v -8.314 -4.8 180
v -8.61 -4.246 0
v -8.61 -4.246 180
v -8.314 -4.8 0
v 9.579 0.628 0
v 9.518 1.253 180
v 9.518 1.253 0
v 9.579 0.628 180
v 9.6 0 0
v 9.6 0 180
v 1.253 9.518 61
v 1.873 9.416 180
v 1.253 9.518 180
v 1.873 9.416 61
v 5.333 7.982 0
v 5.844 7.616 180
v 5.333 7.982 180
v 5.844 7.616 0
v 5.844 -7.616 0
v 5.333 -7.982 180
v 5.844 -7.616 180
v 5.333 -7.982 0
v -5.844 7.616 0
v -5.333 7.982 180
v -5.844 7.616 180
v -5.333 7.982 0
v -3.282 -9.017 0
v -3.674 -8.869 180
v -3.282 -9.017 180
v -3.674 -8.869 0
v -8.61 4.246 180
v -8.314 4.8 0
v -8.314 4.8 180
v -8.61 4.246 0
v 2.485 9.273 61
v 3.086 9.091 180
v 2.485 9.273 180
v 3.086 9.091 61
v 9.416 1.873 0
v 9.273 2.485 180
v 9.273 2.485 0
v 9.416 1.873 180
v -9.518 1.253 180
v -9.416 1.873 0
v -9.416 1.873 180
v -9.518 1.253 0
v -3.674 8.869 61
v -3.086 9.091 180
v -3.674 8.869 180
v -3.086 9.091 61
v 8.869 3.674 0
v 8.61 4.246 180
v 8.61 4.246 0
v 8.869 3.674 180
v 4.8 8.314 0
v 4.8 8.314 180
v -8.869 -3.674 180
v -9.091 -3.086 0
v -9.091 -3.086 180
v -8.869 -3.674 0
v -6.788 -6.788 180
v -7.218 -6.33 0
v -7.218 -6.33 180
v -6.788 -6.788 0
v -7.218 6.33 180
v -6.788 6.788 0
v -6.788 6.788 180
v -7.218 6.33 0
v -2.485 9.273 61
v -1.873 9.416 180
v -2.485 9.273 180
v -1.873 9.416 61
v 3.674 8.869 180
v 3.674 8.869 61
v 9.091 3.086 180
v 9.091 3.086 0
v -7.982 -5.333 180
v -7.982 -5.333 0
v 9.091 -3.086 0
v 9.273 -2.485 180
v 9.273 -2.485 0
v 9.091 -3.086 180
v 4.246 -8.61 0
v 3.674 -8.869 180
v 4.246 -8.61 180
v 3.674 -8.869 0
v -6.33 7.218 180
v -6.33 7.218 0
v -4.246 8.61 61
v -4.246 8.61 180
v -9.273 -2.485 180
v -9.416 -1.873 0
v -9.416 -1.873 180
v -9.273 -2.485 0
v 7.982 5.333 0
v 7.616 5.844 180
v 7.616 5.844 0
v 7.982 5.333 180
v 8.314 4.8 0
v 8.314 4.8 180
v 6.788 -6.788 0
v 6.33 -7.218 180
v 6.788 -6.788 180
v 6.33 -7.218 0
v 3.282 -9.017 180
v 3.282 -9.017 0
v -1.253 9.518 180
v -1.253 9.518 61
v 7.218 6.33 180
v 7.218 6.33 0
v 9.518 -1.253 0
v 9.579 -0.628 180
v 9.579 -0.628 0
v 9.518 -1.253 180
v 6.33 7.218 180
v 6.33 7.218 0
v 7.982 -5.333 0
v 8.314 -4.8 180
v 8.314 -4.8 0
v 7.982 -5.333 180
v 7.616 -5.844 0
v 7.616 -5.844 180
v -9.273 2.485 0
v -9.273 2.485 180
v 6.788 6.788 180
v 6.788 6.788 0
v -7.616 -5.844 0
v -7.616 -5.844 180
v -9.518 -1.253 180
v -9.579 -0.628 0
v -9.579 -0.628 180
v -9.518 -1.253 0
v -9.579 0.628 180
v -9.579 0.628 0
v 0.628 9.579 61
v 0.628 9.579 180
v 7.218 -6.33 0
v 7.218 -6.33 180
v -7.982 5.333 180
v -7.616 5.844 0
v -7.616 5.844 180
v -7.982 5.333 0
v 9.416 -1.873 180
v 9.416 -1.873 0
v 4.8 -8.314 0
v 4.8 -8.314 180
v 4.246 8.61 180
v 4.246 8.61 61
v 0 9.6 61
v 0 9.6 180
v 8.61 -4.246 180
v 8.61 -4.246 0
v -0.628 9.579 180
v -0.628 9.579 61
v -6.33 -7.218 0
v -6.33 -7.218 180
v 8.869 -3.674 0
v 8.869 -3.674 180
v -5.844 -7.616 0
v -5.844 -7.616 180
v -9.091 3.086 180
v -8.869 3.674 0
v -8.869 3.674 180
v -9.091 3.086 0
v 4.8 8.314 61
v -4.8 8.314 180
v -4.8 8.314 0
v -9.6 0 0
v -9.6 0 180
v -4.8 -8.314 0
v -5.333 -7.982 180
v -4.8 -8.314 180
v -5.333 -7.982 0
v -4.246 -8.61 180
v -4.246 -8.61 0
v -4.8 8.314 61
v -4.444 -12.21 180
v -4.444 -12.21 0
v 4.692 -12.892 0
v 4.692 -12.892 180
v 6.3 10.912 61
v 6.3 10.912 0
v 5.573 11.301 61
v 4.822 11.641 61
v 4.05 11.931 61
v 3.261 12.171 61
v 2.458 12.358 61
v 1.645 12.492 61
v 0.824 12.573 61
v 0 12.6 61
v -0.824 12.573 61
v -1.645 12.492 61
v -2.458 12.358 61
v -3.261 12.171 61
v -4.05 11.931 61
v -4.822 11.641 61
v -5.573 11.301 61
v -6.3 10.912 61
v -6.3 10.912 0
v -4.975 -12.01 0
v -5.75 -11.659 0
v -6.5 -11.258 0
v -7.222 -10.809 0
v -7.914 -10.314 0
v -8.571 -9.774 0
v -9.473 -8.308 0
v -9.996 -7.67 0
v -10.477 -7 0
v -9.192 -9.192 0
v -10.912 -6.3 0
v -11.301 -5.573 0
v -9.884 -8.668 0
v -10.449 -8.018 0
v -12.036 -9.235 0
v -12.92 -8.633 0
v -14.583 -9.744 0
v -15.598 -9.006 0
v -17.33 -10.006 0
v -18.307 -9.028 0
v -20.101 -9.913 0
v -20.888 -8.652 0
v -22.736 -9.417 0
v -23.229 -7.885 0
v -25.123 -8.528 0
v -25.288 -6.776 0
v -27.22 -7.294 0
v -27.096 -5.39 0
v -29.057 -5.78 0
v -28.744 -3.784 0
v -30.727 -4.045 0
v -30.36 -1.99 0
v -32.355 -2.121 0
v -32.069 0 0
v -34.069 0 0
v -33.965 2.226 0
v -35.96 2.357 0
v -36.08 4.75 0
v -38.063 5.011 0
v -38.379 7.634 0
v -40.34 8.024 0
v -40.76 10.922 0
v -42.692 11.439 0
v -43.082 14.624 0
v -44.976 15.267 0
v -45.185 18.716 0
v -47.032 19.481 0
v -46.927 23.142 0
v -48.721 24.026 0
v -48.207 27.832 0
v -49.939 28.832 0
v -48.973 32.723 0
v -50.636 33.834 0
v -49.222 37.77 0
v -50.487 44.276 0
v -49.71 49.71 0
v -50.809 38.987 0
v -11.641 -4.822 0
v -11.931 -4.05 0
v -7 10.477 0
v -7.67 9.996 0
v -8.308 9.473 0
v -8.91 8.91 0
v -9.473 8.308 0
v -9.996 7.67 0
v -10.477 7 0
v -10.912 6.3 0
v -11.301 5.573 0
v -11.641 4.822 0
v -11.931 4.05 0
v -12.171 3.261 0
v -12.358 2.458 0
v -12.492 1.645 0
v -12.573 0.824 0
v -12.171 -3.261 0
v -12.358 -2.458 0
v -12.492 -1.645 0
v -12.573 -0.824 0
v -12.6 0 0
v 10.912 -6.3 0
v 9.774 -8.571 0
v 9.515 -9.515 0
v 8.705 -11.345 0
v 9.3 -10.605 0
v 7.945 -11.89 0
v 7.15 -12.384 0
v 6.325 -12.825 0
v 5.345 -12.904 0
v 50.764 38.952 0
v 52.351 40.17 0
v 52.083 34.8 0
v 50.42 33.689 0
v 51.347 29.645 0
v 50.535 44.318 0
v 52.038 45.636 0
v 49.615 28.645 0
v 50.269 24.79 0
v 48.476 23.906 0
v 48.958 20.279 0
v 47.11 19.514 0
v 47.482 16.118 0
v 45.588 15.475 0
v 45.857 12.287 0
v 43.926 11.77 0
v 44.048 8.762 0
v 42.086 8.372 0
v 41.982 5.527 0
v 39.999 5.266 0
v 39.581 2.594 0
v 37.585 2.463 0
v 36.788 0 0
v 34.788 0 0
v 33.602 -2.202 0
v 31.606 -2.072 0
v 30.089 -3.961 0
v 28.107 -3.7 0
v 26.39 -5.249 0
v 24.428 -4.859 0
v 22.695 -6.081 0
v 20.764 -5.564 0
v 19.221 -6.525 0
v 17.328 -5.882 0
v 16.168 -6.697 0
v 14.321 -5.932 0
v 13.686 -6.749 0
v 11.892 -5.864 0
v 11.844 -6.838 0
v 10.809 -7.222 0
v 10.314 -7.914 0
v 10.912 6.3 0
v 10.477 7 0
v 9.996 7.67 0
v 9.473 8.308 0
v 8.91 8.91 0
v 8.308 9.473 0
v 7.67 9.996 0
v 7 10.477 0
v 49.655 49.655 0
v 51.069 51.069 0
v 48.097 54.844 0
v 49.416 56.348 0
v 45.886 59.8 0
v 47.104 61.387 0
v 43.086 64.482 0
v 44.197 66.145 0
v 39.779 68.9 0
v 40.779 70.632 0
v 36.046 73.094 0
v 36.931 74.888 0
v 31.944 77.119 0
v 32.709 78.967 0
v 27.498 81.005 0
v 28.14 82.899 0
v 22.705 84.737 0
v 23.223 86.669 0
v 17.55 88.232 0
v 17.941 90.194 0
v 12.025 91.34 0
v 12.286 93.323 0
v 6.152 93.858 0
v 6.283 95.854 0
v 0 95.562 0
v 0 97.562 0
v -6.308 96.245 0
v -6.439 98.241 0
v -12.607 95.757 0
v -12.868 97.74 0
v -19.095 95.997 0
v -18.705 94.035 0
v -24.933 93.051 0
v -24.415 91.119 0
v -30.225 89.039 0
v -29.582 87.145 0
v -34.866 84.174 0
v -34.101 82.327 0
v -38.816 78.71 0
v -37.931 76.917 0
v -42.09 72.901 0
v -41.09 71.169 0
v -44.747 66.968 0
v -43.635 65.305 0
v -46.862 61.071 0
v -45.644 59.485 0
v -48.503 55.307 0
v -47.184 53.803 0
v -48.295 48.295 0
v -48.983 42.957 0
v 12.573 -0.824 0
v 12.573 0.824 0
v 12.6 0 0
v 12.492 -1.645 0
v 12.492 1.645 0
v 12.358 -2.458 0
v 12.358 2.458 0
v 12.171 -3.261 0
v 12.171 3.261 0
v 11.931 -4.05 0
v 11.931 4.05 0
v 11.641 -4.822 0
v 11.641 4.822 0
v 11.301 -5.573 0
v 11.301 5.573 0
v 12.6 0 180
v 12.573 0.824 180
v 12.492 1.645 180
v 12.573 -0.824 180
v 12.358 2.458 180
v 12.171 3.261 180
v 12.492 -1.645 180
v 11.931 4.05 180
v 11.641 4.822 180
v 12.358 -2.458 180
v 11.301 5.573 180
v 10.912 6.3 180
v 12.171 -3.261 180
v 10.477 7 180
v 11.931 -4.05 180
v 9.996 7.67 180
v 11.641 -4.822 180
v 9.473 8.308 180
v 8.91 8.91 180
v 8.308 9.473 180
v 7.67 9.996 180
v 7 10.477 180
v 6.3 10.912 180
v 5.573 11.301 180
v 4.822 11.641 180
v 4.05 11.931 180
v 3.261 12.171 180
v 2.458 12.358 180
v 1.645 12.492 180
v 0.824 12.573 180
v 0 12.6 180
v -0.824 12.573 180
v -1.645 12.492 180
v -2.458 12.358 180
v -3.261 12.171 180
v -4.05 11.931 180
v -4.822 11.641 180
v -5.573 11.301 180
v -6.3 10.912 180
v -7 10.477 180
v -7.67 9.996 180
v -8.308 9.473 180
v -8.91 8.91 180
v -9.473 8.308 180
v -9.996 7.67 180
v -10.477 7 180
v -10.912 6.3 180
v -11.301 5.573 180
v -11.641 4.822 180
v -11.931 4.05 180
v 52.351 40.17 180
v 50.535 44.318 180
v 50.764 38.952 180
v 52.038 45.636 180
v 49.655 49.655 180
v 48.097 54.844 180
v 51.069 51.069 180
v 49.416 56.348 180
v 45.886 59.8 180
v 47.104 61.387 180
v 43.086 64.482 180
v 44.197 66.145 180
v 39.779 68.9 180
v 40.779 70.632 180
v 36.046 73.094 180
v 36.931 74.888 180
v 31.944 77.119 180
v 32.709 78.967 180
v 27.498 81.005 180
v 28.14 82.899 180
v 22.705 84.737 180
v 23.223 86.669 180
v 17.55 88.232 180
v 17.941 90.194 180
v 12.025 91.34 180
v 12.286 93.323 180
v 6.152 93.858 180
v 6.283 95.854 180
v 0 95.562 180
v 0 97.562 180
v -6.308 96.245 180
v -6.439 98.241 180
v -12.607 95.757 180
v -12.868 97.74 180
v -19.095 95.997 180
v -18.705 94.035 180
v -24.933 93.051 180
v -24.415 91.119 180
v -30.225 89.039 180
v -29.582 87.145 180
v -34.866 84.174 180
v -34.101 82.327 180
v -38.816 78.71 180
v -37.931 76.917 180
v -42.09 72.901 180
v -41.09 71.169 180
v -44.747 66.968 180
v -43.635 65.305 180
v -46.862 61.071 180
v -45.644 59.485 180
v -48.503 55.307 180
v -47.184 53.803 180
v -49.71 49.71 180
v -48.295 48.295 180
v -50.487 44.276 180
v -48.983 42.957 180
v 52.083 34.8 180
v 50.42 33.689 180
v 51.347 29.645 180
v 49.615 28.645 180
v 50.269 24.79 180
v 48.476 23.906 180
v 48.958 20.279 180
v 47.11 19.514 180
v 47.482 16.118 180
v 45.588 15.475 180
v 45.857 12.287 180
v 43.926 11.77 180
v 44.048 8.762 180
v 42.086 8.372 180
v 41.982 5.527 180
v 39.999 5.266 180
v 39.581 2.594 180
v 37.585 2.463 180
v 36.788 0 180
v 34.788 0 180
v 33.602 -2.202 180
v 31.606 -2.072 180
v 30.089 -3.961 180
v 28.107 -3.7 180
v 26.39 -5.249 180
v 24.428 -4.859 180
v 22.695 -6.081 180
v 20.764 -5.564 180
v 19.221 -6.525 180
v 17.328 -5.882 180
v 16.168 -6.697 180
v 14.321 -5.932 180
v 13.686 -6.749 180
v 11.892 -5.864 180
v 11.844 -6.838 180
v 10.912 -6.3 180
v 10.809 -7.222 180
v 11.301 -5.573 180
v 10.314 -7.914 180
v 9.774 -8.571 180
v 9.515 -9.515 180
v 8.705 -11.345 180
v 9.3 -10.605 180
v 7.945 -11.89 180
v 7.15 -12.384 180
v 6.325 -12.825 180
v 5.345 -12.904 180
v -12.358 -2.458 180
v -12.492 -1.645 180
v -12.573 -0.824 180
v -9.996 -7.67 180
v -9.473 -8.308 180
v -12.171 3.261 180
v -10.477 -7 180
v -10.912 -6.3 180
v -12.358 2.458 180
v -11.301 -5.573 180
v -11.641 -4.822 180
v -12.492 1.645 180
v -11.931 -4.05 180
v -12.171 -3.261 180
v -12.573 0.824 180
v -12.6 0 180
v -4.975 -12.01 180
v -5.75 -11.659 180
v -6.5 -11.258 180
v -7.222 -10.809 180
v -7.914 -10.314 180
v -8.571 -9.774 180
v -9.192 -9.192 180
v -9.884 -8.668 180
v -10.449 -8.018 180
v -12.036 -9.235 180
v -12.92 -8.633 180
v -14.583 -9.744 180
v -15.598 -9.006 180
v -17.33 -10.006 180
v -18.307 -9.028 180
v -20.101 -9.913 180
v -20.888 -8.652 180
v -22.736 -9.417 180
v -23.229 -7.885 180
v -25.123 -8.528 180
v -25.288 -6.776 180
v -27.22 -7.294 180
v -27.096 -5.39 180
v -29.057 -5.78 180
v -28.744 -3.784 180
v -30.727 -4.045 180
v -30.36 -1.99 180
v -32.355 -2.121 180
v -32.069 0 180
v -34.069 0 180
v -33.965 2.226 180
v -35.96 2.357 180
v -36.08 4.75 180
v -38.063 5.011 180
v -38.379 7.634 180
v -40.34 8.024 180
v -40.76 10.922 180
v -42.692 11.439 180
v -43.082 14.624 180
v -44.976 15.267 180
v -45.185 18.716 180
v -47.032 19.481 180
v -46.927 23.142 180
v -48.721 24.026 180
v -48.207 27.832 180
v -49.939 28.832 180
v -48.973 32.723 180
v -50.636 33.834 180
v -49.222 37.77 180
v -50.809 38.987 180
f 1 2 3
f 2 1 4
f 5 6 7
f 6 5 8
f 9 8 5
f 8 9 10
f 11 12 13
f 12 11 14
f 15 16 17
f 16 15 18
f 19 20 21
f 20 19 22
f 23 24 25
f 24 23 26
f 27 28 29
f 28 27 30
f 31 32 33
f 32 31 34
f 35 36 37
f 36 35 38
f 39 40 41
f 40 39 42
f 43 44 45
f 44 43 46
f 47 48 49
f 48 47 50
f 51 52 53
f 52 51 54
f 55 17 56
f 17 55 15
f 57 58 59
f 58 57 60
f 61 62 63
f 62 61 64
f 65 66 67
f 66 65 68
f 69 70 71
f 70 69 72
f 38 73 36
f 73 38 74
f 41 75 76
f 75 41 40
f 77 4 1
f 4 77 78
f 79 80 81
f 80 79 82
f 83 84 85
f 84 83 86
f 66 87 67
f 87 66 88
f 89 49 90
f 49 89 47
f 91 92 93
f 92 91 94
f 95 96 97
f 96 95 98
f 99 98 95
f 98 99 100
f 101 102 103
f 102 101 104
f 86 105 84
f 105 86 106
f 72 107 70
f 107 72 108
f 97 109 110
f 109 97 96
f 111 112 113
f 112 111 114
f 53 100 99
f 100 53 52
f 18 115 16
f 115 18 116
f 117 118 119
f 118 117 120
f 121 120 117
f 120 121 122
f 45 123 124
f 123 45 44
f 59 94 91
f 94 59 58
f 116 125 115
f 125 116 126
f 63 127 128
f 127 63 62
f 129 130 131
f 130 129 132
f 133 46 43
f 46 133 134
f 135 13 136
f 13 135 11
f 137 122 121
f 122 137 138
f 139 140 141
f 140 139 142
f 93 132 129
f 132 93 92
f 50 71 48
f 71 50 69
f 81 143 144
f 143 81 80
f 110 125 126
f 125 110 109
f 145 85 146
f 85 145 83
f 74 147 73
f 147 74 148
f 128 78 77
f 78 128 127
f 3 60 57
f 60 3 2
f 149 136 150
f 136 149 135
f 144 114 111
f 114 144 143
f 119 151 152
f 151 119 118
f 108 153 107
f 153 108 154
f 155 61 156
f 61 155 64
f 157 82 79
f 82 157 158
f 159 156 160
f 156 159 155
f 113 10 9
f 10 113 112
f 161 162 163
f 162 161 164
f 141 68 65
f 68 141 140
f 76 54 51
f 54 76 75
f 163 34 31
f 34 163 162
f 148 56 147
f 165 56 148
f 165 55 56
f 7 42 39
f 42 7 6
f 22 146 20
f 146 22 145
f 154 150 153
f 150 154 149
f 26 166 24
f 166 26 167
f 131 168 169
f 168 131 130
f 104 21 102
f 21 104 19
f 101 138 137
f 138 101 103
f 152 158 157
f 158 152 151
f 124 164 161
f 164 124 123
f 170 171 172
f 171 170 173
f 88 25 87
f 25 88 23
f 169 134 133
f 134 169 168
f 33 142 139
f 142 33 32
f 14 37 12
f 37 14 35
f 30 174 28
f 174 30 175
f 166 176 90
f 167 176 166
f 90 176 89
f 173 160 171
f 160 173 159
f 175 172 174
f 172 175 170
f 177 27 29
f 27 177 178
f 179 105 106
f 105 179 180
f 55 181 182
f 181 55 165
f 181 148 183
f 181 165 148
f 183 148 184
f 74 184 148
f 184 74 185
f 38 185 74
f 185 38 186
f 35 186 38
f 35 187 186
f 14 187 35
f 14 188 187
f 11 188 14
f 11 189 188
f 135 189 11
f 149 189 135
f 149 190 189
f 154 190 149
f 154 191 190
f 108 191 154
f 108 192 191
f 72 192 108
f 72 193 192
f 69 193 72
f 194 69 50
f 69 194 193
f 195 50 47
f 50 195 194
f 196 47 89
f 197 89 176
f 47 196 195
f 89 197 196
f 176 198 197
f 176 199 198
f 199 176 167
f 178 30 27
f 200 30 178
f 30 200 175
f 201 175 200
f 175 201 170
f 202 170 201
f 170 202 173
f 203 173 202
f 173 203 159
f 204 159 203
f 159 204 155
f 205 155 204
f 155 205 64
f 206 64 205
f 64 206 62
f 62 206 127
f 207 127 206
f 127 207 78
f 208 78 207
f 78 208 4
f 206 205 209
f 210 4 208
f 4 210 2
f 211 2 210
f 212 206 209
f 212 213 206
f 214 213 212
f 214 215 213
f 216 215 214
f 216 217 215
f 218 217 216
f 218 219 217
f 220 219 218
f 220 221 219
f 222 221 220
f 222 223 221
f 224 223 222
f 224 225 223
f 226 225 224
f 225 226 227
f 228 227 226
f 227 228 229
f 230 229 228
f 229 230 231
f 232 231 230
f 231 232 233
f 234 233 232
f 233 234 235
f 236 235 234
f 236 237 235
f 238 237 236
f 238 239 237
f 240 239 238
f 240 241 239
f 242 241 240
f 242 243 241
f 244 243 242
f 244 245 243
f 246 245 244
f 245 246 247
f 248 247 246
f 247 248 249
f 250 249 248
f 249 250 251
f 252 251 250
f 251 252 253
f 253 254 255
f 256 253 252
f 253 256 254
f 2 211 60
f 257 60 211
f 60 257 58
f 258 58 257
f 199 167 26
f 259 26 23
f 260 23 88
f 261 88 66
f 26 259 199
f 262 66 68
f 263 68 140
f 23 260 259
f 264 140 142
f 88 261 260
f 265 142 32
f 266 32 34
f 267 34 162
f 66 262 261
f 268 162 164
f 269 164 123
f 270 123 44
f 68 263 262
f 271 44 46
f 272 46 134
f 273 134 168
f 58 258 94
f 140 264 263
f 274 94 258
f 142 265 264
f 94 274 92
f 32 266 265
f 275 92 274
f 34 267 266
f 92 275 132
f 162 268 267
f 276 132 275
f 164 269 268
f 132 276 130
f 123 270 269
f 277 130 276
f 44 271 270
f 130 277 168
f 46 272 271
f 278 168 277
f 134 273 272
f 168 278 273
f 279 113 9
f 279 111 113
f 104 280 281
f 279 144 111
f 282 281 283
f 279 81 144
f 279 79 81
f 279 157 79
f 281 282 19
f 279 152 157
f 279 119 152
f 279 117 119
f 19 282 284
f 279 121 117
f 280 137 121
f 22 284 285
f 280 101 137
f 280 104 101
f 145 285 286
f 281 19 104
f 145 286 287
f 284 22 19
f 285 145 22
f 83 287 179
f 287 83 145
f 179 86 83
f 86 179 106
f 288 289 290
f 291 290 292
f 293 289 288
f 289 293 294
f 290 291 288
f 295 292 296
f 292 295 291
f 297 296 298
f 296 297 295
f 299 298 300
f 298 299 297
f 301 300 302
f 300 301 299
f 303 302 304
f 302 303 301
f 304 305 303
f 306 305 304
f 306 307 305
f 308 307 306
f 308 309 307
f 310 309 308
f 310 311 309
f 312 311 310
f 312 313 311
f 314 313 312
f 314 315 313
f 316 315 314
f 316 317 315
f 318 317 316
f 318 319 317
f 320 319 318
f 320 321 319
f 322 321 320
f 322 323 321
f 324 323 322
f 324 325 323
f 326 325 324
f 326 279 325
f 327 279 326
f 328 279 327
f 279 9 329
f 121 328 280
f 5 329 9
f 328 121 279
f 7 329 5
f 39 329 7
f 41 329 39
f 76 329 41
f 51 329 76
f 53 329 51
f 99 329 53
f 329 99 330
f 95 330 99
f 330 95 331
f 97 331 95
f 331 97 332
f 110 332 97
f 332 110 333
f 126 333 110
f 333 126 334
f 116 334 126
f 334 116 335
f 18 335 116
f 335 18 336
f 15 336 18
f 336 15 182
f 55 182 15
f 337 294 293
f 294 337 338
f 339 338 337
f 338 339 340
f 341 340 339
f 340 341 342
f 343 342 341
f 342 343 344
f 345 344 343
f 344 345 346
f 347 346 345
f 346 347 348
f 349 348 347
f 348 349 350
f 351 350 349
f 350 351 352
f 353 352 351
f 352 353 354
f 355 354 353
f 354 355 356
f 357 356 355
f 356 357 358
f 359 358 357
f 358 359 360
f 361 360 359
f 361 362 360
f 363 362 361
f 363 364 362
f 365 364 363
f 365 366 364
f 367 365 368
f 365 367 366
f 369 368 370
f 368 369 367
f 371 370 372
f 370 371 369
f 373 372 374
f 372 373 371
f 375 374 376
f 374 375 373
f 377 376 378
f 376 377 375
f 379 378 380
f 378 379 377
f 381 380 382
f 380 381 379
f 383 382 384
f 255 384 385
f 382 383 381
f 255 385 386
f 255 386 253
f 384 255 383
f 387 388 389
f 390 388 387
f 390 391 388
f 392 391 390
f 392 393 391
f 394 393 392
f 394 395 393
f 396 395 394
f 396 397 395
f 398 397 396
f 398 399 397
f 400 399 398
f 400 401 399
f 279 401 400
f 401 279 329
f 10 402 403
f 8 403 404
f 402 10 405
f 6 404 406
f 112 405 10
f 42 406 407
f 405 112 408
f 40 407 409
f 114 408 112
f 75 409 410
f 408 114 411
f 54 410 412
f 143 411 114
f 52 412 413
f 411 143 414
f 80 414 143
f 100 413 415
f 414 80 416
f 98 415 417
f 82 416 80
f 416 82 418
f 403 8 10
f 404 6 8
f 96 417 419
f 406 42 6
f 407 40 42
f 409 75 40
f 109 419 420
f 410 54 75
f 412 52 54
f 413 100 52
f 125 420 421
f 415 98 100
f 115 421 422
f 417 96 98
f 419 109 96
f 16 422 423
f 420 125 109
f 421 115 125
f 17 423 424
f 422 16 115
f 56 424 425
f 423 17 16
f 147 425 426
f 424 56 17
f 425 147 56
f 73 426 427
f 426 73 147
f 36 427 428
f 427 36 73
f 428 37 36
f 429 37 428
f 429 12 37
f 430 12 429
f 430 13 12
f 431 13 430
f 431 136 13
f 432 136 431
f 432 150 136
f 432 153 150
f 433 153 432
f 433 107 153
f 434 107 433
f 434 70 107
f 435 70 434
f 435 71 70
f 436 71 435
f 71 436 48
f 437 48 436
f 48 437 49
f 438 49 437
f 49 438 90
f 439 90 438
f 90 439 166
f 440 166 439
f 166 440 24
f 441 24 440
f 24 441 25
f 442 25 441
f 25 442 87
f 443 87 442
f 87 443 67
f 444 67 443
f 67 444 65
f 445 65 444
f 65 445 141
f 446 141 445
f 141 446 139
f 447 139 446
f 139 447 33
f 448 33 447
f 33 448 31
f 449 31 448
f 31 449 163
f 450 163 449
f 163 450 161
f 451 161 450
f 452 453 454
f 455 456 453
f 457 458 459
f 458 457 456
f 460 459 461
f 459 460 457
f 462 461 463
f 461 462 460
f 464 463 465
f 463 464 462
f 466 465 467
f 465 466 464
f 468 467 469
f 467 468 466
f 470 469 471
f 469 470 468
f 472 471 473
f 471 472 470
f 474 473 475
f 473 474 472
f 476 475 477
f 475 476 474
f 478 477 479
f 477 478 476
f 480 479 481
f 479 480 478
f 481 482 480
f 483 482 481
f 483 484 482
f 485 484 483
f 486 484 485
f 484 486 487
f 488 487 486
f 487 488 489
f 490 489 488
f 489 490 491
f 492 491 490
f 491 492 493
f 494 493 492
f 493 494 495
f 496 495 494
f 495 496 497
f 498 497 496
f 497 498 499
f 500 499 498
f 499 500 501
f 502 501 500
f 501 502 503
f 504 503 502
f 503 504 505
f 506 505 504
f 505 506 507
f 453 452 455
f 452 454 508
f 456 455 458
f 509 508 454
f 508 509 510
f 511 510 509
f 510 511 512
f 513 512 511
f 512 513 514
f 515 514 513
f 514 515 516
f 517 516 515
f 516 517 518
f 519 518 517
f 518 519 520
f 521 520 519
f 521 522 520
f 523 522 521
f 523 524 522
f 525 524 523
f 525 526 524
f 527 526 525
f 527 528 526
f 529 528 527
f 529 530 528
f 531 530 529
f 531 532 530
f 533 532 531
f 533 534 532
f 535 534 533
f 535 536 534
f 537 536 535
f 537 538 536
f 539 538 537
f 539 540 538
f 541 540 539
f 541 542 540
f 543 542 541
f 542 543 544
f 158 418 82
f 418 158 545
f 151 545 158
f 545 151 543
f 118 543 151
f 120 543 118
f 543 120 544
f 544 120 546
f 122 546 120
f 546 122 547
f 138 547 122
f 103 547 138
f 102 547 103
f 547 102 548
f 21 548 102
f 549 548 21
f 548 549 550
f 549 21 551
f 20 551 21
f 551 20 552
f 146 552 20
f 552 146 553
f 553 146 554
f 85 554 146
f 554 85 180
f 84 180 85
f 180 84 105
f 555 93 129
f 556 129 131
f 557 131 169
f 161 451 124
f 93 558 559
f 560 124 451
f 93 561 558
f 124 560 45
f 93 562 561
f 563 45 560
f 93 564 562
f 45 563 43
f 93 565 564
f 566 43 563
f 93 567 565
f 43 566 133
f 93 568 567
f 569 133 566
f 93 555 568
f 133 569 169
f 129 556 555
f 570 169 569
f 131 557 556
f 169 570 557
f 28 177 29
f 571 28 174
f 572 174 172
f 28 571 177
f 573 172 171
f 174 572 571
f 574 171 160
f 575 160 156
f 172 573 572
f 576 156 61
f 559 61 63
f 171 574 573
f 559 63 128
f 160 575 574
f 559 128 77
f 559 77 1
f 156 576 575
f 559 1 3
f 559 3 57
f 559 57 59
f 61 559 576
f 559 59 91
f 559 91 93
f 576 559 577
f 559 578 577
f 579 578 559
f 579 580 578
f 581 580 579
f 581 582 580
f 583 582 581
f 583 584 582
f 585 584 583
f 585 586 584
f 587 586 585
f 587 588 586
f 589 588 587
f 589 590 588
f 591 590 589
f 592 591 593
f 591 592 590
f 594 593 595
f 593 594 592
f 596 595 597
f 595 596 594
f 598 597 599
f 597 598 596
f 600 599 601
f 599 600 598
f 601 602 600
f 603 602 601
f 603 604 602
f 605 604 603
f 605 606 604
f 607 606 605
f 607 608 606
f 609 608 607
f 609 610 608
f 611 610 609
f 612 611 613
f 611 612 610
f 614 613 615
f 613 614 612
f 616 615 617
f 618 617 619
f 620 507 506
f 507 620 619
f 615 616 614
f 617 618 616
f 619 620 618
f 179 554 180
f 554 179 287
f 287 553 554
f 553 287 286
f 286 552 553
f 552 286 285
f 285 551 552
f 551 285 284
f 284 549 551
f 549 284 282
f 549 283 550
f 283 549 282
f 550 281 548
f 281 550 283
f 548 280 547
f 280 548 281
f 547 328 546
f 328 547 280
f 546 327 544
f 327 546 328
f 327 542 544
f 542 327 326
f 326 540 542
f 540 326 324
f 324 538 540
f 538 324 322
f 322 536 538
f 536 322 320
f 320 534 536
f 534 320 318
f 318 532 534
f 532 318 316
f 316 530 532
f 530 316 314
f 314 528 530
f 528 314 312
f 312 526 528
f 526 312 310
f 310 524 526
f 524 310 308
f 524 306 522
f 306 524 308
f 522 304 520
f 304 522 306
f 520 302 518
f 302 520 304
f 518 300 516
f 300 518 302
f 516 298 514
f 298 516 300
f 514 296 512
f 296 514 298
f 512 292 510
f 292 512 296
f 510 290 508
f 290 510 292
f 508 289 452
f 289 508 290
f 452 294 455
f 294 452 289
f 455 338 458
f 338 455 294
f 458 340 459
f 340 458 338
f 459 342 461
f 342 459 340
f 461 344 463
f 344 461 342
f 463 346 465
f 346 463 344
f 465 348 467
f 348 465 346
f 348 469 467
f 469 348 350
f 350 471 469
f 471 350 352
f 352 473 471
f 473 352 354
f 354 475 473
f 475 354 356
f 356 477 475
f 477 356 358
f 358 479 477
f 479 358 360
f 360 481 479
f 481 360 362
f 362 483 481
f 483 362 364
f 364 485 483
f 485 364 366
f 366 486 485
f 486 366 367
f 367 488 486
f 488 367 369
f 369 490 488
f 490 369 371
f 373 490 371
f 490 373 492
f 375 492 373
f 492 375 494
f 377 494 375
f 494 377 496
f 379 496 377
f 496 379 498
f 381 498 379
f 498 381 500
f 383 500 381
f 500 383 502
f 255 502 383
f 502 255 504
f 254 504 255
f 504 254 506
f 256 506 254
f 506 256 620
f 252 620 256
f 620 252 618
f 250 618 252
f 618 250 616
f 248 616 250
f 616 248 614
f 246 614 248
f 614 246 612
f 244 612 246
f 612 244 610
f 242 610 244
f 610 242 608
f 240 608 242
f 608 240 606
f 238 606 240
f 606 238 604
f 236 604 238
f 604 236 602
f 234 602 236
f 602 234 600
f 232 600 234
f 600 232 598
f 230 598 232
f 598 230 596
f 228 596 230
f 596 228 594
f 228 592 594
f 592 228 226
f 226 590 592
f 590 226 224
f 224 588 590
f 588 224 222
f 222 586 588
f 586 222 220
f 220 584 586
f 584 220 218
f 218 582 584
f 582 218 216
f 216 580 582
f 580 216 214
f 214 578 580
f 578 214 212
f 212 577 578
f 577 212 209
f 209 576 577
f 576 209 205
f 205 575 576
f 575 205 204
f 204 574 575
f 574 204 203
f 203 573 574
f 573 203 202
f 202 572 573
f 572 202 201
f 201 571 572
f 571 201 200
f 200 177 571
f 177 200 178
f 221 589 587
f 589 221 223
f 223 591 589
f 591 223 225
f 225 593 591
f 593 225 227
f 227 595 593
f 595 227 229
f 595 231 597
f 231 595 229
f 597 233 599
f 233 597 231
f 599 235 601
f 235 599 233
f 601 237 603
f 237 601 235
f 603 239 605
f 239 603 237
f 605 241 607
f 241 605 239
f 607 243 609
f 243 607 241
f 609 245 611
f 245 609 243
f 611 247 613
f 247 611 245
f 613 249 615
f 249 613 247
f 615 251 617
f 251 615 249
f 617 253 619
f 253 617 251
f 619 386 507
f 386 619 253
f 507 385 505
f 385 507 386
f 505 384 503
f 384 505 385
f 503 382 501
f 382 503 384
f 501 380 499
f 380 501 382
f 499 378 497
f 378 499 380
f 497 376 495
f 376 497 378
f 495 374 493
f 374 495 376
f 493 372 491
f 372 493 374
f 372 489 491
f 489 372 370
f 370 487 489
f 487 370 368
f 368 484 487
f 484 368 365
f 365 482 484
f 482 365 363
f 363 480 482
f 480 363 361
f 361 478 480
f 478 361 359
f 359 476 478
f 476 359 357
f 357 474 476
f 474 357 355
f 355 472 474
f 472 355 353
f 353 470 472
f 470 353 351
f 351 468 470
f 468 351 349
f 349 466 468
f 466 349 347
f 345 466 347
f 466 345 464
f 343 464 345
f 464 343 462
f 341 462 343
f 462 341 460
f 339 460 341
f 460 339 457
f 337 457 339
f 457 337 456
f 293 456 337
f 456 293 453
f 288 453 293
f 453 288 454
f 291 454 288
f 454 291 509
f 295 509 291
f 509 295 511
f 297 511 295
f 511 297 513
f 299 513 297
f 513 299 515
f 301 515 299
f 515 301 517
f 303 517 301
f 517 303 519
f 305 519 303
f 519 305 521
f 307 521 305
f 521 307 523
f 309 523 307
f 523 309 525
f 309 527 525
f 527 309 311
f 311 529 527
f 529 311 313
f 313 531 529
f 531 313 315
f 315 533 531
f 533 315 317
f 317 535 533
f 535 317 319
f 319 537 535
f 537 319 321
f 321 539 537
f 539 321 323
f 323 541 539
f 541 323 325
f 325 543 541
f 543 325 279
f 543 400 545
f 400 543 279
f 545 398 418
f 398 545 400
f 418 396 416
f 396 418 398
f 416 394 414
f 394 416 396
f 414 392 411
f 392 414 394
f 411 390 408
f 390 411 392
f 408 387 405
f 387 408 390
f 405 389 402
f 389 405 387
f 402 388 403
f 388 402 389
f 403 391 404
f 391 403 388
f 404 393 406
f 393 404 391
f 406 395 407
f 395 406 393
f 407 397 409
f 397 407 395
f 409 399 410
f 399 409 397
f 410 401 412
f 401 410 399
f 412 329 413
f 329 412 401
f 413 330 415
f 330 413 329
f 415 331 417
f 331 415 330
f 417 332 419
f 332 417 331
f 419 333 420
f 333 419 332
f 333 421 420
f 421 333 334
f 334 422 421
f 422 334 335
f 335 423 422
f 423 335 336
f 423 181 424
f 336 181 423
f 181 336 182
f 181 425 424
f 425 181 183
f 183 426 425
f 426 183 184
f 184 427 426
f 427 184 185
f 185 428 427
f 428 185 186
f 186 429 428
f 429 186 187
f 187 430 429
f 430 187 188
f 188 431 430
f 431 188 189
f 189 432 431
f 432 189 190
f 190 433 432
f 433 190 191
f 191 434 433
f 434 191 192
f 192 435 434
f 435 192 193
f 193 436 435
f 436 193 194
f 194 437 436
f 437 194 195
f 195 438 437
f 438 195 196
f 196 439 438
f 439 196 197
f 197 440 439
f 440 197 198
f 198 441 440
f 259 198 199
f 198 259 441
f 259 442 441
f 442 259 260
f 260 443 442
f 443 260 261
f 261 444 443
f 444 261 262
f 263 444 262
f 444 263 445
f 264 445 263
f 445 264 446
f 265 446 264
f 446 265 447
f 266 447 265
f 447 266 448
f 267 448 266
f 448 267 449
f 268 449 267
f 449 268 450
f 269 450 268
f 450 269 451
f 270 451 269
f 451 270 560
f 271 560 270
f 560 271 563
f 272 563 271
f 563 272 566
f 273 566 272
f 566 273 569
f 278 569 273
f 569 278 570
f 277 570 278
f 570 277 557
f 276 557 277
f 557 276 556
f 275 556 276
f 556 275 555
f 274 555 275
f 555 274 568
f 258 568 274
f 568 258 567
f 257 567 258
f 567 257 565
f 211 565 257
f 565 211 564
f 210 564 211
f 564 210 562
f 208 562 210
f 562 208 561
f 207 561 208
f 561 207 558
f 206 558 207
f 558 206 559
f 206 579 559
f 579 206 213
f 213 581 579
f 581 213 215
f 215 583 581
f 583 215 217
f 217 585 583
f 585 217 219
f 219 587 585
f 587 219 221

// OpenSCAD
// Lampenschirm für Stehlampe – organischer, wellenförmiger Querschnitt
// mit Klemmkragen, der in die Form integriert ist (keine D-Form mehr)
// Alle Maße in Millimetern (Regel: units-mm)
//
// Kontext: context/printer.md, context/tolerances.md und context/materials.md
// waren zum Zeitpunkt der Modellierung leer (siehe Regel: context-first).
// Annahmen aus dem Design-Dialog (siehe auch 001/002):
//   - Baubett >= 200mm Z-Höhe vorhanden -> Schirm wird als ein Teil,
//     stehend, in voller Höhe gedruckt.
//   - Klemmkragen als offener Federclip (C-Ring): Innendurchmesser 0.8mm
//     unter Stangendurchmesser (19.2mm ID auf 20mm Stange) für Vorspannung.
//   - E14-Fassung wird separat an der Stange montiert.
//
// Änderungen gegenüber 009 (Nutzer-Feedback: Schlaufen-Artefakt nahe der
// Klemme, rechte Seite wieder nicht sauber verbunden):
//   - Tatsächliche Ursache gefunden per Winkel-Sweep (0.25°-Schritte, volle
//     360°, siehe Analyse-Skripte im Scratchpad): min_r (11.6mm) lag UNTER
//     clip_r_out (12.6mm). An Winkeln, wo die Welle die Außenkontur bis auf
//     min_r herunterdrückte, wurde dadurch die berechnete Kavität (die
//     mindestens clip_r_out groß sein muss) größer als die Außenkontur
//     selbst - ein geometrisch unmögliches/entartetes Polygon, das sich als
//     Schlaufe/losgelöstes Stück zeigte.
//   - Fix 1: min_r auf 13.0mm angehoben (über clip_r_out), damit die
//     Außenkontur nie enger werden kann als der Klemmkragen selbst - per
//     Sanity-Check über alle 1440 Stützpunkte verifiziert (kein Winkel mehr,
//     an dem Außenkontur < Kavität wäre).
//   - Fix 2: Kavität wird jetzt als einzelne durchgehende Radiusfunktion
//     (cavity_r = max(Wandinnenseite, clip_r_out)) statt als Verschneidung
//     von Außenkontur-Polygon und separatem Kreis (collar_disk_2d) gebaut -
//     robuster, da nur noch eine einzige, garantiert einfache Polygonkurve
//     statt zweier unabhängig tessellierter Formen verschnitten wird.
//   - Fix 3: neck_guard_width auf 40° verbreitert, damit die Kontur nahe der
//     Klemme nur noch einmal (nicht mehrfach) zwischen "verbunden" und
//     "frei" wechselt (per Sweep verifiziert: 2 statt 4 Übergänge).

// ---- Parameter ----
shade_height = 180;   // Gesamthöhe des Schirms
wall_t       = 2;     // Wandstärke Schirm (durchgehend, auch am Klemmkragen-Übergang)

rod_d      = 20;                 // Durchmesser der Metallstange
rod_r      = rod_d / 2;
clip_id    = 19.2;               // Innendurchmesser Klemmkragen (Vorspannung, ~0.8mm Untermaß)
clip_r_in  = clip_id / 2;
clip_wall  = 3;                  // Wandstärke Klemmkragen (dicker als Schirmwand, für Klemmkraft)
clip_r_out = clip_r_in + clip_wall;
clip_gap_deg = 40;               // Öffnungswinkel des C-Rings (Montagespalt, zeigt nach -Y)

socket_slot_deg    = 60;              // Öffnungswinkel des Fassungs-Schlitzes (Innenseite, +Y) - Annahme
socket_slot_height = shade_height / 3; // unteres Drittel der Klemme ist auf der Innenseite offen

// Organische Grundform: Potenzfunktion statt Fourier-Reihe, damit die
// Rückseite (θ=270°) über einen breiten Winkelbereich flach bleibt, statt
// steil anzusteigen.
back_r  = 13;     // Zielradius an der Rückseite (θ=270°) - eng am Klemmkragen
front_r = 95;      // Zielradius an der Front (θ=90°)
flatten_power = 2; // höher = flacherer/breiterer "Hals" um die Klemme, aber schmalere Seiten

// Wellen-Überlagerung für den organischen/wellenförmigen Look (Front/Seiten) -
// bewusst moderat, damit die Kontur nahe der Klemme nicht mehrfach kreuzt
wave_amp1 = 3;   wave_freq1 = 4;  wave_phase1 = 40;
wave_amp2 = 1.5; wave_freq2 = 7;  wave_phase2 = 115;
wave_fade_width = 55;   // Welle erreicht erst ab diesem Winkelabstand von der Rückseite volle Stärke

// Sicherheitsgrenzen: garantieren, dass die Kontur nahe der Rückseite den
// Klemmkragen nie verfehlt UND nie enger als der Klemmkragen selbst wird
neck_guard_width = 40;                     // Winkelbereich, in dem der obere Deckel aktiv ist
max_neck_r = clip_r_out + wall_t - 0.3;    // = 14.3mm, garantiert Überlappung mit Sicherheitsabstand
min_r      = 13.0;                          // untere Grenze, IMMER > clip_r_out (12.6mm) - siehe Fix 1

cut_far = 300;   // "unendlich" großer Radius für Schnitte, die garantiert bis nach außen durchbrechen sollen

$fn = 96;

// Winkelabstand zwischen theta und center (0-180°, robust über den 0°/360°-Übergang)
function angle_diff(theta, center) =
    let(d = abs(theta - center))
    (d > 180) ? 360 - d : d;

// Hüllkurve 0 (direkt an der Rückseite) bis 1 (ab wave_fade_width Grad Abstand)
function wave_envelope(theta) =
    let(d = angle_diff(theta, 270))
    (d >= wave_fade_width) ? 1 : (1 - cos(180 * d / wave_fade_width)) / 2;

// Radius der organischen Außenkontur in Abhängigkeit vom Winkel θ (Grad)
function organic_r(theta) =
    let(phi = theta - 90)
    let(u = (1 + cos(phi)) / 2)   // 0 an der Rückseite (θ=270°), 1 an der Front (θ=90°)
    let(base = back_r + (front_r - back_r) * pow(u, flatten_power))
    let(raw_wave = wave_amp1 * sin(wave_freq1 * theta + wave_phase1)
                 + wave_amp2 * sin(wave_freq2 * theta + wave_phase2))
    let(wave = raw_wave * wave_envelope(theta))
    let(r_free = base + wave)
    let(d = angle_diff(theta, 270))
    let(r_guarded = (d < neck_guard_width) ? min(r_free, max_neck_r) : r_free)
    max(r_guarded, min_r);

// Radius der Kavität (Hohlraum-Grenze): normale Wandinnenseite, aber nie
// enger als der Klemmkragen (clip_r_out) - dadurch bleibt der Kragen überall
// solide statt hohl, ganz ohne separate Kreis-Verschneidung.
function cavity_r(theta) =
    max(organic_r(theta) - wall_t, clip_r_out);

// Geschlossenes 2D-Profil, um shrink (mm) nach innen verkleinert
module organic_outline(shrink = 0) {
    step = 360 / $fn;
    polygon(points = [
        for (t = [0 : step : 360 - step])
            [(organic_r(t) - shrink) * cos(t), (organic_r(t) - shrink) * sin(t)]
    ]);
}

// Ringform (Annulus): gefüllte Fläche bis cavity_r(θ) MINUS Kreis(clip_r_out).
// Wichtig: eine reine gefüllte Fläche bis cavity_r(θ) wäre FALSCH - da
// cavity_r(θ) an Winkeln fern der Rückseite sehr groß wird (z.B. ~93mm an
// der Front), würde eine gefüllte Fläche dort den kompletten Klemmkragen
// mit-entfernen. Der Kreisabzug stellt sicher, dass r < clip_r_out IMMER
// massiv bleibt, unabhängig vom Winkel.
module cavity_outline() {
    step = 360 / $fn;
    difference() {
        polygon(points = [
            for (t = [0 : step : 360 - step])
                [cavity_r(t) * cos(t), cavity_r(t) * sin(t)]
        ]);
        circle(r = clip_r_out);
    }
}

// Keilförmiger 2D-Ausschnitt, zentriert auf Winkel 0
module pie_wedge_2d(radius, angle_deg) {
    a = angle_deg / 2;
    polygon(points = [
        [0, 0],
        [radius * cos(a), radius * sin(a)],
        [radius * cos(-a), radius * sin(-a)]
    ]);
}

// 2D-Profil der Wand: durchgehend wall_t dick, mit massivem, nahtlos
// integriertem Klemmkragen-Rohling an der Rückseite
module shell_with_boss_2d() {
    difference() {
        organic_outline(0);
        cavity_outline();
    }
}

module organic_shell() {
    linear_extrude(height = shade_height)
        shell_with_boss_2d();
}

// Radialer Schlitz von z0 bis z1, in Richtung facing_deg ausgerichtet
module radial_slot(radius, angle_deg, facing_deg, z0, z1) {
    translate([0, 0, z0])
        rotate([0, 0, facing_deg])
            linear_extrude(z1 - z0)
                pie_wedge_2d(radius, angle_deg);
}

// Alle Ausschnitte für die Klemme: durchgehende Stangenbohrung + Montagespalt
// (volle Höhe, -Y, bricht bis zur echten Außenwand durch, damit seitlich
// eingeclipst werden kann) + Fassungs-Schlitz (unteres Drittel, +Y, öffnet
// nur bis in den ohnehin dort schon hohlen Innenraum)
module clamp_cutouts() {
    union() {
        translate([0, 0, -1])
            cylinder(r = clip_r_in, h = shade_height + 2);

        radial_slot(cut_far, clip_gap_deg, 270, -1, shade_height + 1);

        radial_slot(clip_r_out + 5, socket_slot_deg, 90, -1, socket_slot_height + 1);
    }
}

// render() erzwingt die vollständige (exakte) Boolesche Berechnung statt der
// schnellen OpenCSG-Live-Vorschau, damit die Klemme auch in der OpenSCAD-
// Vorschau (F5) korrekt dargestellt wird.
render(convexity = 10)
    difference() {
        organic_shell();
        clamp_cutouts();
    }
